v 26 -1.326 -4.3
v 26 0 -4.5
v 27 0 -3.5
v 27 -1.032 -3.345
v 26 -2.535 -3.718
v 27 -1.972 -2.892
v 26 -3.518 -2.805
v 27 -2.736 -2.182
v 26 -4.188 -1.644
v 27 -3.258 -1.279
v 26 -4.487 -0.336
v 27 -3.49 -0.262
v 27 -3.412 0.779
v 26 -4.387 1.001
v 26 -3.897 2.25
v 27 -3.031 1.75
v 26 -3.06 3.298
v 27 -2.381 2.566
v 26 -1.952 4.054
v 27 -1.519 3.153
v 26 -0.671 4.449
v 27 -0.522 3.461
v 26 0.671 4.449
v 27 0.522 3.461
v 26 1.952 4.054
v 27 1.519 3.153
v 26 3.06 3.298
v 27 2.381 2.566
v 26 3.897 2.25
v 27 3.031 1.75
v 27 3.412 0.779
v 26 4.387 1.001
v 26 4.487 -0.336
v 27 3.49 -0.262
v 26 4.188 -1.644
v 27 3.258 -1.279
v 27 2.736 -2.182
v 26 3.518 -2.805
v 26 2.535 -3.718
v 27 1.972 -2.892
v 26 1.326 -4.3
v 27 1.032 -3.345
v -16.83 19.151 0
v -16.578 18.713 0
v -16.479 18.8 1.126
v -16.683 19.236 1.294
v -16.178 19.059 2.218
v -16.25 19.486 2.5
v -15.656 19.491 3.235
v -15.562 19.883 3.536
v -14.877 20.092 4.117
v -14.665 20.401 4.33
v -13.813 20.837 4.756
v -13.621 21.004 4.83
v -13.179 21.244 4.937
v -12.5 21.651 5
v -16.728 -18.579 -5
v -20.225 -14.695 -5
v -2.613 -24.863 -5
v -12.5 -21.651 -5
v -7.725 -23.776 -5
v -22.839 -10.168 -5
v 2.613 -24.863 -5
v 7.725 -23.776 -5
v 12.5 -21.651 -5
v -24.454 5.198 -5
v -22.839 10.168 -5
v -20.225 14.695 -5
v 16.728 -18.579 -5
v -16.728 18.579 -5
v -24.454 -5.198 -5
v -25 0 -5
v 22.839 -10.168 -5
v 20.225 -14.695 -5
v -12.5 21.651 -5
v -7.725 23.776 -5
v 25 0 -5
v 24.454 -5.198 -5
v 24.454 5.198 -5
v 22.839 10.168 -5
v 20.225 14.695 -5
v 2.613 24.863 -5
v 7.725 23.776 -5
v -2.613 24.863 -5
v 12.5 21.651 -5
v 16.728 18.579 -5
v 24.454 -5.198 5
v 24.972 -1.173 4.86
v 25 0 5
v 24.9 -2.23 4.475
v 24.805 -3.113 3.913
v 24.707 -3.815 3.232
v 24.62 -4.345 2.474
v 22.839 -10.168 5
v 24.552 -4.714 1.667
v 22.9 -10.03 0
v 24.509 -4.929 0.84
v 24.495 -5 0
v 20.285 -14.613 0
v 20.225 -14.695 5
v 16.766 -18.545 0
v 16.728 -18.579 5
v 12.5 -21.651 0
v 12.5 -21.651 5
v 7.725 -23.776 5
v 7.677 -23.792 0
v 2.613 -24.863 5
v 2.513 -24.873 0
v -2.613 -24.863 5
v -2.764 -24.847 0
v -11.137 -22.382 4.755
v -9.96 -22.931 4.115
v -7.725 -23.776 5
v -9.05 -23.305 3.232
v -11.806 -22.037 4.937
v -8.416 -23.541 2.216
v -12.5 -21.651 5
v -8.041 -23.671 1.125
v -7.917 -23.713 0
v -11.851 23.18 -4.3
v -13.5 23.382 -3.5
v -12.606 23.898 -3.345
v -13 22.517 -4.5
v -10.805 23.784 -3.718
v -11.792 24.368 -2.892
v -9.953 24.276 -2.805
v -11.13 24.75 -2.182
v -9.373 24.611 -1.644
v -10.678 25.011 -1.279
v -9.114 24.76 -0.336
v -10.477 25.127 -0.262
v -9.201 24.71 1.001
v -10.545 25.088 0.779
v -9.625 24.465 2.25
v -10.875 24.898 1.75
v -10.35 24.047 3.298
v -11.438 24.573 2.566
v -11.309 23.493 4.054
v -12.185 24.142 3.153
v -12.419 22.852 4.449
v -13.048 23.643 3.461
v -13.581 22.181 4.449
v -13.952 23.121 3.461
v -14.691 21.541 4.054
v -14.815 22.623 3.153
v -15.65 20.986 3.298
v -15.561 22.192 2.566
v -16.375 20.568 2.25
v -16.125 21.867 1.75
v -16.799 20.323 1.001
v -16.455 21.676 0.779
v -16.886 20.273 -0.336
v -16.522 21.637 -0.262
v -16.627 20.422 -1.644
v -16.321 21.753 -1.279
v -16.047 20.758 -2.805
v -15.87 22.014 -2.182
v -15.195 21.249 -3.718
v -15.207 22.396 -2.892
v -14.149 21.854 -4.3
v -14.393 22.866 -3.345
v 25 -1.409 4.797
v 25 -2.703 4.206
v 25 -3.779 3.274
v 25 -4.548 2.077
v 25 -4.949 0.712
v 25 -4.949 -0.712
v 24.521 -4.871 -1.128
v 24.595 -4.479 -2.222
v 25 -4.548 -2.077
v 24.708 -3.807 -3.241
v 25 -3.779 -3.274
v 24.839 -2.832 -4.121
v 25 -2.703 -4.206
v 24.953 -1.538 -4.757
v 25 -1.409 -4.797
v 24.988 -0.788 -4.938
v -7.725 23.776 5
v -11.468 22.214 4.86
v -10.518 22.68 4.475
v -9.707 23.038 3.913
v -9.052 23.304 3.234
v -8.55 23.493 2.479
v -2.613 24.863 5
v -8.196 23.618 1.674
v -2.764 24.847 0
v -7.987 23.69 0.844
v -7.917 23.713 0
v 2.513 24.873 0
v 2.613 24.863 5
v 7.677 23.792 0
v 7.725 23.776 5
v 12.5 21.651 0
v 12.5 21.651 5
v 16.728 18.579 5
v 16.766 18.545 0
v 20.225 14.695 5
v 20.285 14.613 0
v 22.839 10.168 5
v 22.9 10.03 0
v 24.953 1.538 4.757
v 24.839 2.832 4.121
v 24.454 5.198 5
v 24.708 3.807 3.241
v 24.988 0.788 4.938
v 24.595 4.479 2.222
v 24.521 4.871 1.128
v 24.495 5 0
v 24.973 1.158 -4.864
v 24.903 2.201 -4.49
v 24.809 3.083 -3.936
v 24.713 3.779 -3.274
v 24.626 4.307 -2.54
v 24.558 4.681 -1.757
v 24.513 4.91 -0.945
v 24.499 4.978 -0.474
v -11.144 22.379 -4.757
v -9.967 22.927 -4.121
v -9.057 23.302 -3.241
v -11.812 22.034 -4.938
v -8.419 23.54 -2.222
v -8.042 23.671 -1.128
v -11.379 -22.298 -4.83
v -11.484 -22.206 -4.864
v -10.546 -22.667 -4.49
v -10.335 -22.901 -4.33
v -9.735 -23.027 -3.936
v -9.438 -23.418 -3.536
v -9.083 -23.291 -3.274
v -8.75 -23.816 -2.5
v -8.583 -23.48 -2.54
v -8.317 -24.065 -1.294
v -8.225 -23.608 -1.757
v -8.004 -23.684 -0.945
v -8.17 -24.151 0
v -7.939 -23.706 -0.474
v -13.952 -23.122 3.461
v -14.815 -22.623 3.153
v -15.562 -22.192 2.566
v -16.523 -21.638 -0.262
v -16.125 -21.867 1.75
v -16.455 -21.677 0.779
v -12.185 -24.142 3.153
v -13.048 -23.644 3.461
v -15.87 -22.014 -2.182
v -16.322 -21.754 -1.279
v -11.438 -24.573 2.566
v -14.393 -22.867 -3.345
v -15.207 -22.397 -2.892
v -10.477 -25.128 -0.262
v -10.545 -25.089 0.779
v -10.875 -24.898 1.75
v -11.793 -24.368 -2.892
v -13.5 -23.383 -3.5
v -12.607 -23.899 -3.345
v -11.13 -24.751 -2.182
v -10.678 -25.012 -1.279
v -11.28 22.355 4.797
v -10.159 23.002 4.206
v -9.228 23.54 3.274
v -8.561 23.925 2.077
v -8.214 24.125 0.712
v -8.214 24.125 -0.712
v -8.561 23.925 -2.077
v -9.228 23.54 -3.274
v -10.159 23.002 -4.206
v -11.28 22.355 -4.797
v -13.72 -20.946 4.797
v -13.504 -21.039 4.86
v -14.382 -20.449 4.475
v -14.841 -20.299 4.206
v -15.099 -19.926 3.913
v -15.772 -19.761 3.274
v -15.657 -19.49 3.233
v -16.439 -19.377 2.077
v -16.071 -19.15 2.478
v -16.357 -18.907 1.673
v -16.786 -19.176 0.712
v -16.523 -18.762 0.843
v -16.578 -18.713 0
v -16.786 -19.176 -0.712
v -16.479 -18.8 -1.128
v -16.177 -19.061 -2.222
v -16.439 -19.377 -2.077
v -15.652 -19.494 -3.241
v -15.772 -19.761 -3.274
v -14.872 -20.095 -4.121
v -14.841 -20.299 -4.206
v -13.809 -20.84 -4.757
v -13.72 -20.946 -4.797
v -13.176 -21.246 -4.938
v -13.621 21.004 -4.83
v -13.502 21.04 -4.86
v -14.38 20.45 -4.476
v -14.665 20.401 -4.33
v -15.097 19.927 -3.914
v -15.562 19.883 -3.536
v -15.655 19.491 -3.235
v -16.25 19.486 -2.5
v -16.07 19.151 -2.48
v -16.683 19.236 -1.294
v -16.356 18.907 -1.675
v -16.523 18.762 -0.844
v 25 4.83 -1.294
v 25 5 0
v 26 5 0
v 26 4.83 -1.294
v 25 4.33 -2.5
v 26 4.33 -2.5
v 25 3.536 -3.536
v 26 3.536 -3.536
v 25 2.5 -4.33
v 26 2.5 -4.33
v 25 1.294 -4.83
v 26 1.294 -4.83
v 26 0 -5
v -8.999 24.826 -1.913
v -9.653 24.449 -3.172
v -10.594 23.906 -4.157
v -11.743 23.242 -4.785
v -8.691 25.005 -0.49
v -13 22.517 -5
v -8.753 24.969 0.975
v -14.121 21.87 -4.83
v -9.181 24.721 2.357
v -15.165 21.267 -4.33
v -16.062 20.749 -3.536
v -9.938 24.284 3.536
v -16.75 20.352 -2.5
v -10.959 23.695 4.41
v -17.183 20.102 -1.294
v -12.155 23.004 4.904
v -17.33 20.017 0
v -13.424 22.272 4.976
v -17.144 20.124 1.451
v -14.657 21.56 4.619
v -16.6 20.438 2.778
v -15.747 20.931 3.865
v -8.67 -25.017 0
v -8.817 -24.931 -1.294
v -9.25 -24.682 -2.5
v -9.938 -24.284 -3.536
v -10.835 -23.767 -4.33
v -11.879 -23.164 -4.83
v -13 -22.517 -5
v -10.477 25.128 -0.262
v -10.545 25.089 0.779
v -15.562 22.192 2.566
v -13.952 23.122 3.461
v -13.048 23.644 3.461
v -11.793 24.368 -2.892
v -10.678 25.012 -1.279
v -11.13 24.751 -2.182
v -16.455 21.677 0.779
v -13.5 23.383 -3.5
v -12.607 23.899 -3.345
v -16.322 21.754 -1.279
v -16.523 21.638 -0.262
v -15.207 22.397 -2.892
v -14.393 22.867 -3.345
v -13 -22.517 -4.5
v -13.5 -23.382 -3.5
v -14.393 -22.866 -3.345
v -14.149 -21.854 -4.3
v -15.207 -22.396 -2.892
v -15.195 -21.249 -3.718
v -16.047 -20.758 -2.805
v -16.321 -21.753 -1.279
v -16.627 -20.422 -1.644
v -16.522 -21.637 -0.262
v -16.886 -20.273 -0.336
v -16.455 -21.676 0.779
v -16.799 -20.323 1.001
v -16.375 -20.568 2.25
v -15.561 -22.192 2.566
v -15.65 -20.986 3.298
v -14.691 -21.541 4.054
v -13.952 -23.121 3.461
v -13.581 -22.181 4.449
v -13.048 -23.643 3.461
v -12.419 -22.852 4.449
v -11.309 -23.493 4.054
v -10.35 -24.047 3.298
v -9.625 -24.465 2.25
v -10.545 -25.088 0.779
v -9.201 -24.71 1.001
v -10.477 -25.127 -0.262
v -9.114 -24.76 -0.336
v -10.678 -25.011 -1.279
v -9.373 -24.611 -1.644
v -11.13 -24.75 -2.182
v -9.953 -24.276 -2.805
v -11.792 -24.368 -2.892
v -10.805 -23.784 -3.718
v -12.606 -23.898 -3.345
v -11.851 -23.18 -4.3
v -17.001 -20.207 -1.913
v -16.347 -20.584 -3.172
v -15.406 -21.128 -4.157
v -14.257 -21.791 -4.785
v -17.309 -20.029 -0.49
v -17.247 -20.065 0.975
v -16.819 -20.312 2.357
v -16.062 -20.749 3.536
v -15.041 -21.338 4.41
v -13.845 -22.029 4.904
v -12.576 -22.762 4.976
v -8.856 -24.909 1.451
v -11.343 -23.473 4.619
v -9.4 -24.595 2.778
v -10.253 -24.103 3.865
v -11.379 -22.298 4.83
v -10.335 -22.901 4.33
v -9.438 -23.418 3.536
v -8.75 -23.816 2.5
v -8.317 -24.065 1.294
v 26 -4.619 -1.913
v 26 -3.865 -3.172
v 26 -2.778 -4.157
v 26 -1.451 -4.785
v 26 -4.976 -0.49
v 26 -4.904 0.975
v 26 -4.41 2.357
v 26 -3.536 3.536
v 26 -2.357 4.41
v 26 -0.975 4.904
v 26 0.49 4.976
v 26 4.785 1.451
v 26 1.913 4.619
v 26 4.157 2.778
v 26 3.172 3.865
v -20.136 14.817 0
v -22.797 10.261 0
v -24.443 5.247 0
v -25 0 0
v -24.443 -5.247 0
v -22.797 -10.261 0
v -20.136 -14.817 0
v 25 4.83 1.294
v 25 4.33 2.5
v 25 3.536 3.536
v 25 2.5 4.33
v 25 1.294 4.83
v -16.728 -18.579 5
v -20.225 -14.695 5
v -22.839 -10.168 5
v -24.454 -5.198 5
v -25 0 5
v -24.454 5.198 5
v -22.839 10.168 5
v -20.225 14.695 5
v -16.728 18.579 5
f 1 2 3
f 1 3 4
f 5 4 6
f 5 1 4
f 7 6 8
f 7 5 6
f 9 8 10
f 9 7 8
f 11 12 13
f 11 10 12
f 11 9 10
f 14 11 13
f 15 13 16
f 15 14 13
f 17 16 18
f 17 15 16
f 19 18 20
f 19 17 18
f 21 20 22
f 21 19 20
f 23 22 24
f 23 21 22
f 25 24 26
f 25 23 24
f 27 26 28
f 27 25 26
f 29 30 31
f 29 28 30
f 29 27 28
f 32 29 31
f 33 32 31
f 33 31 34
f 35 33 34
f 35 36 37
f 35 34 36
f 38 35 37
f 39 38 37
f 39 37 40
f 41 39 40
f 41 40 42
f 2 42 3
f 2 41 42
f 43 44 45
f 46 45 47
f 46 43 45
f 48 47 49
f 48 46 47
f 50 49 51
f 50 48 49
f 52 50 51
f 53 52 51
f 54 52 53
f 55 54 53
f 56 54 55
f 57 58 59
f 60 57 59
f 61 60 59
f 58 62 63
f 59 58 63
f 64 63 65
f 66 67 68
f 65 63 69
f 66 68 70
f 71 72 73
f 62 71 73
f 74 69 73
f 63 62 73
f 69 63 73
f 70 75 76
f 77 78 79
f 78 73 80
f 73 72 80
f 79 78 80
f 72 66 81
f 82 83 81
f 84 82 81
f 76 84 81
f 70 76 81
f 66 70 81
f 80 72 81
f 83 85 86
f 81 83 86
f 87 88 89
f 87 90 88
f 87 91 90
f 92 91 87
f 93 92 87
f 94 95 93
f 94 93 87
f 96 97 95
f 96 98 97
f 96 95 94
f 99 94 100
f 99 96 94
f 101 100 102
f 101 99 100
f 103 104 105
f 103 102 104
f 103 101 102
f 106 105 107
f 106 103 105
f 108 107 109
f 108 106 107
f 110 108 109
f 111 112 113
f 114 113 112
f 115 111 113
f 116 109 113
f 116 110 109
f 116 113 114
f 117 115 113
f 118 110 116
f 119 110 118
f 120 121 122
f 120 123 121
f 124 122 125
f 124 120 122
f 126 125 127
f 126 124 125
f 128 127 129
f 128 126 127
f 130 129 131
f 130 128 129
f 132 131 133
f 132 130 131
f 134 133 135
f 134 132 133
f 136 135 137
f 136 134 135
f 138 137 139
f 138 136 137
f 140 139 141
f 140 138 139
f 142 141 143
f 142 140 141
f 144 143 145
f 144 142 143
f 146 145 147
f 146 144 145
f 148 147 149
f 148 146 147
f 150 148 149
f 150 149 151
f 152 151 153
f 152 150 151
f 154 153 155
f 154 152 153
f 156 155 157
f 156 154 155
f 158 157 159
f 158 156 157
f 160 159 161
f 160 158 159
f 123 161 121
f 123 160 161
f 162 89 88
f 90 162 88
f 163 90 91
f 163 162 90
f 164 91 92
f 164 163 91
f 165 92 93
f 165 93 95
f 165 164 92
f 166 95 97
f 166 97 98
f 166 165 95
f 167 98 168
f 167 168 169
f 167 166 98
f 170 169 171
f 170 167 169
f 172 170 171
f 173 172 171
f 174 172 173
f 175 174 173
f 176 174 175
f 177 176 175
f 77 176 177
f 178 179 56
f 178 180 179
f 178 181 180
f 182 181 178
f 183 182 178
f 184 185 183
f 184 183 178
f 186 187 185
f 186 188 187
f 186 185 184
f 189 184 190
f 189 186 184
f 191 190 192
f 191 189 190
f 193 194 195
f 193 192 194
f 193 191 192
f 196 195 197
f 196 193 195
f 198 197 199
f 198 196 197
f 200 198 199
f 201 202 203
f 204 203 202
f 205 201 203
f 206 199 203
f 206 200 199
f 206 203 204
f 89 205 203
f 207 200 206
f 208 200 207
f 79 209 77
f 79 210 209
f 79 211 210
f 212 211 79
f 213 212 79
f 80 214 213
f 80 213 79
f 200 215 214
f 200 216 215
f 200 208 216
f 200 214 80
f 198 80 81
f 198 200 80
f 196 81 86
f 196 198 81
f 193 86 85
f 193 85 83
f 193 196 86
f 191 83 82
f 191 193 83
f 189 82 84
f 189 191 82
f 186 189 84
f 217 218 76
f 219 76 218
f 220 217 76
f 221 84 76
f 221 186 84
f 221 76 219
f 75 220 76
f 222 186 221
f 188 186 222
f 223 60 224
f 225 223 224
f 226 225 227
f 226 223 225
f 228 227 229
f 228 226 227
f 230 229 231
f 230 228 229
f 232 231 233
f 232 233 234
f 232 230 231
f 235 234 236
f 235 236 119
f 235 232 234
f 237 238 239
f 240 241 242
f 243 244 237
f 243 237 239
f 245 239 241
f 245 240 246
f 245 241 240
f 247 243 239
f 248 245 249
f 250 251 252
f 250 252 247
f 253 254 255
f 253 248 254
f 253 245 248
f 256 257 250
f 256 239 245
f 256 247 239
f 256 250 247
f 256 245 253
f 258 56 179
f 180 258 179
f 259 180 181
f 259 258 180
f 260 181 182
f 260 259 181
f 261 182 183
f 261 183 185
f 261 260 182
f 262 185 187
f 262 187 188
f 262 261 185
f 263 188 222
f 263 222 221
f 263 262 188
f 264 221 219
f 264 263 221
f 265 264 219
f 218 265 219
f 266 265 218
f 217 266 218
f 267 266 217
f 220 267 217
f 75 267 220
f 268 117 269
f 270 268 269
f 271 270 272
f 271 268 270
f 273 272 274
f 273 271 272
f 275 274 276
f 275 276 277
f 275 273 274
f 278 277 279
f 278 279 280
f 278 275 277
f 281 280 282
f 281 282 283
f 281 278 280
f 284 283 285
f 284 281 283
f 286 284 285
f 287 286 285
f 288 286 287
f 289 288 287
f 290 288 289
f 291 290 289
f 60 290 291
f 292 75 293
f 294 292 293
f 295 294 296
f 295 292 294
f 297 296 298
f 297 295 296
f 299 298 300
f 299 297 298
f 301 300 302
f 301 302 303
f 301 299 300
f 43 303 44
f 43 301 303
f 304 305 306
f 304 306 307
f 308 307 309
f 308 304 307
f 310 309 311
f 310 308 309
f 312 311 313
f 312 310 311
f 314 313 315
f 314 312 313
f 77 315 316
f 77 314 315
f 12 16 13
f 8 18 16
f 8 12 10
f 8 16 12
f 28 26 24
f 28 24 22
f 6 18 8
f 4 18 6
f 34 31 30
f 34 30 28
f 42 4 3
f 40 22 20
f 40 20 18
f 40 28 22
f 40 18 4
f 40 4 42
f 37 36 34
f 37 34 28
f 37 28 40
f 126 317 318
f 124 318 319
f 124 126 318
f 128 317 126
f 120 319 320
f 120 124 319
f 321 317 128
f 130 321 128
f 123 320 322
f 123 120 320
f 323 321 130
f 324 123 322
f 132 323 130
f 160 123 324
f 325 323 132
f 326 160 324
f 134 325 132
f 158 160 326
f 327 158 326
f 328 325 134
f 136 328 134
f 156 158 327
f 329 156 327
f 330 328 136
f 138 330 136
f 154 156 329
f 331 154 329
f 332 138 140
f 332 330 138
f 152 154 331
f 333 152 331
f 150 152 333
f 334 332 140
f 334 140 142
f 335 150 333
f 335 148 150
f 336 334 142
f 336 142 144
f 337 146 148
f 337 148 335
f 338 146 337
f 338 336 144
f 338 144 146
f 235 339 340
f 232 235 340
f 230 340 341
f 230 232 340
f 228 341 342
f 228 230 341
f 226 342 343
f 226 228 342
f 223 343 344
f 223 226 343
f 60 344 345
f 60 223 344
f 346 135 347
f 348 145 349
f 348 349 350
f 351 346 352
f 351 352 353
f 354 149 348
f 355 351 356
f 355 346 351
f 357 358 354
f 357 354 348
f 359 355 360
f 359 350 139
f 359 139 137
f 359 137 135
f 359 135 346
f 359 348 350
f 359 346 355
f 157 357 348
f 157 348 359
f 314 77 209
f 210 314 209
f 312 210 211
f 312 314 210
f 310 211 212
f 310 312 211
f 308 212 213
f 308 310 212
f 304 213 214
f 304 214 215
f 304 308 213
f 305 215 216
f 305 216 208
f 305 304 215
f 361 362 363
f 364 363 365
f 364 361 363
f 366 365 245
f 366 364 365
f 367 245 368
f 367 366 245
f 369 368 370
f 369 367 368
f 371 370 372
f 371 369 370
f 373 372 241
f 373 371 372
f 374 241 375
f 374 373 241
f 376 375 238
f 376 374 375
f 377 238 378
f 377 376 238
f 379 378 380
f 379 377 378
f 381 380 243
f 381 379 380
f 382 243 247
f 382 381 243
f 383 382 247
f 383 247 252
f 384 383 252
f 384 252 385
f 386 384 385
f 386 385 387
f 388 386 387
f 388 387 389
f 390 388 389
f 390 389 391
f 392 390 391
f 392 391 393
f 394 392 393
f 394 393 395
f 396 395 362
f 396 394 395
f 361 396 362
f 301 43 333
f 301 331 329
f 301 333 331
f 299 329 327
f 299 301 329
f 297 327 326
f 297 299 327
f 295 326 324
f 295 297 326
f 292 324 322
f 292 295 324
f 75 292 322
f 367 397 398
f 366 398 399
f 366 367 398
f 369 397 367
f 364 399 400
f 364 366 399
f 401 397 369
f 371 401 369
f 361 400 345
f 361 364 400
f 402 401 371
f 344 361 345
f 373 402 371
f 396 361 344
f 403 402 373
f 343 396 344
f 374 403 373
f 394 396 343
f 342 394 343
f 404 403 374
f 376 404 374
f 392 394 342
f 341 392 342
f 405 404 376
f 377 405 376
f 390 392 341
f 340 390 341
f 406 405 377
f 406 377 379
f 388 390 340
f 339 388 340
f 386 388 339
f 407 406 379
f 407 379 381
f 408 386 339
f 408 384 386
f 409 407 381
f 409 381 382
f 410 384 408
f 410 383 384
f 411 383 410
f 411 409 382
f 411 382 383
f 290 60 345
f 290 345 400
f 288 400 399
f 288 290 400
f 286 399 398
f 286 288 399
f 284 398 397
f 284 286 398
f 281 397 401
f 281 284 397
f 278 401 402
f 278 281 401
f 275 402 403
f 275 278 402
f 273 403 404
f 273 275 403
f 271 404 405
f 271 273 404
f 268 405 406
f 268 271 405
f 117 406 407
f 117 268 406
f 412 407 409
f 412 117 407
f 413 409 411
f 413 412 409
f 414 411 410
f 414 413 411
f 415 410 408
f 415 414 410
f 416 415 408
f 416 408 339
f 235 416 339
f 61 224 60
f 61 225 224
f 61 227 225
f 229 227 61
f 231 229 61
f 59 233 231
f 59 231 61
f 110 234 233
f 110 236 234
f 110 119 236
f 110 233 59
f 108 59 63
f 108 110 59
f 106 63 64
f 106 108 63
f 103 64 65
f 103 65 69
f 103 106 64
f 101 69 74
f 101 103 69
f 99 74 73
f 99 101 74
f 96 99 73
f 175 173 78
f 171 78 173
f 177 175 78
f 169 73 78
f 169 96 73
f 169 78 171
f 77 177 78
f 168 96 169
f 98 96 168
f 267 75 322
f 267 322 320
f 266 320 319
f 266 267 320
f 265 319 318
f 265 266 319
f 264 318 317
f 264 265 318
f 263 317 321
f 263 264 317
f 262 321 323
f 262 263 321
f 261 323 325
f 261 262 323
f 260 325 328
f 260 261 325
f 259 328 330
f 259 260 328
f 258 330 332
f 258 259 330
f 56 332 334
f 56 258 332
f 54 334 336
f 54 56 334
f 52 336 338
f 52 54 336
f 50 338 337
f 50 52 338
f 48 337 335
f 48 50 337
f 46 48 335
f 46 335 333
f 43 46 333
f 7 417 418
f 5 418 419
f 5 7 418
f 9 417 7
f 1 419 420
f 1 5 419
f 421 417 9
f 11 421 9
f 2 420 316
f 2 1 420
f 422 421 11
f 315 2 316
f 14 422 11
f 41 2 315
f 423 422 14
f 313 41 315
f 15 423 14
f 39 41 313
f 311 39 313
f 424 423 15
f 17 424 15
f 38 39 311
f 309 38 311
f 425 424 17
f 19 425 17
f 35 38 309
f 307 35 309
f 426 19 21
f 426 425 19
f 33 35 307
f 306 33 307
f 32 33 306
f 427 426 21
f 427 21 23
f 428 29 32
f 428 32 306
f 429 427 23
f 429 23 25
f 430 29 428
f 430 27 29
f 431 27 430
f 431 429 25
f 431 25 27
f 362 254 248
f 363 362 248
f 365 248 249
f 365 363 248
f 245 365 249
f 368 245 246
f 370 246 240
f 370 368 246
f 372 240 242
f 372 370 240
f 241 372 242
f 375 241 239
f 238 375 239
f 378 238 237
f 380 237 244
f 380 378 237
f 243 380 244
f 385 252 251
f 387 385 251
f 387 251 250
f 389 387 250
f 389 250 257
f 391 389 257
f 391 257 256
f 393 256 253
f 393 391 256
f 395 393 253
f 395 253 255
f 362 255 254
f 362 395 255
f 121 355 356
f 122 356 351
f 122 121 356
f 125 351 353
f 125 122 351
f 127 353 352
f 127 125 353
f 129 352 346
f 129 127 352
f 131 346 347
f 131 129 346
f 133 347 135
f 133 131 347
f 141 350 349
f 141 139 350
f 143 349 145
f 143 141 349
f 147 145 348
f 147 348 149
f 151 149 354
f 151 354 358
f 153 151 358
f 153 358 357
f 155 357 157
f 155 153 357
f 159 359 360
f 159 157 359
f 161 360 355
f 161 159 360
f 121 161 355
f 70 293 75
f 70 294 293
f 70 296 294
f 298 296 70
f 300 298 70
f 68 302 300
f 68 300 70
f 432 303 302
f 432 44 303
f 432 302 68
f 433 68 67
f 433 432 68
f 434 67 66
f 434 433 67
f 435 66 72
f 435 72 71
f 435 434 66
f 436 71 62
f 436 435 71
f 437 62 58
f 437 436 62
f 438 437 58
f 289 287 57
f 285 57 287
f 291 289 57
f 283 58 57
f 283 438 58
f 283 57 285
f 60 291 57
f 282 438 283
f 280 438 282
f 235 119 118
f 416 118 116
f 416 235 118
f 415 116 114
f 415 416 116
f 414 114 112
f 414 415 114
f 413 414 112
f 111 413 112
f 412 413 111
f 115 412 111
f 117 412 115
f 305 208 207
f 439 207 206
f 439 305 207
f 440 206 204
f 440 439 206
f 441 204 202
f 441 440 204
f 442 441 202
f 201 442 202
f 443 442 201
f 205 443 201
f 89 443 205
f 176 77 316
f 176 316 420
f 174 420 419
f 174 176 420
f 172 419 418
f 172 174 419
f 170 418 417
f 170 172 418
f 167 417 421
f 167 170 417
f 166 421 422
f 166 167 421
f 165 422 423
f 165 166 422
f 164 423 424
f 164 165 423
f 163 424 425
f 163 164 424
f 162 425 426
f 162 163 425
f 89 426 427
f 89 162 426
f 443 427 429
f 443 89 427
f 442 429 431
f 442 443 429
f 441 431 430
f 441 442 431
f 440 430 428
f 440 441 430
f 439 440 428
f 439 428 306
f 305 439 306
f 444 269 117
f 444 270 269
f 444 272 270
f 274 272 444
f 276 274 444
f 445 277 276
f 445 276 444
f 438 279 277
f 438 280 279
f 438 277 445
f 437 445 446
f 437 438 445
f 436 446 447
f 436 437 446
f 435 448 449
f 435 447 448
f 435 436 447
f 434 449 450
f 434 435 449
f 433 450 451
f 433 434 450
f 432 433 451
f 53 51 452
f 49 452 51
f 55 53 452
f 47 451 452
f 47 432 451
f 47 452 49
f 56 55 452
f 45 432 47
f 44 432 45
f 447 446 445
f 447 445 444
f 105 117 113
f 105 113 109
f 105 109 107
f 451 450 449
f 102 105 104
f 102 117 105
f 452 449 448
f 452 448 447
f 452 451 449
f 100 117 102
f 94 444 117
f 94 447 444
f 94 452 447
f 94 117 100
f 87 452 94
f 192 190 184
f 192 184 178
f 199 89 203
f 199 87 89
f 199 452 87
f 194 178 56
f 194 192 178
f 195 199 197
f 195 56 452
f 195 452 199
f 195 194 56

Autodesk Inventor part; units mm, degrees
ref_plane "XZ Plane" through (0, 0, 0) normal (0, 1, 0) x (-1, 0, 0)
ref_plane "XY Plane" through (0, 0, 0) normal (0, 0, 1) x (1, 0, 0)
sketch "Sketch1" plane through (0, 0, 0) normal (0, 0, 1) x (1, 0, 0)
  circle A0 centre (0, 0) radius 25
  dimension "d0" = 50
extrude "Extrusion1" add sketch "Sketch1" along normal mid plane 10
ref_plane "Work Plane1" through (25, 0, 0) normal (1, 0, 0) x (0, 1, 0)
sketch "Sketch2" plane through (25, 0, 0) normal (1, 0, 0) x (0, 1, 0)
  circle A0 centre (0, 0) radius 5
  line L0 (-25, -5) -> (25, -5) projected
  point P0 (0, 0)
extrude "Extrusion2" add sketch "Sketch2" along normal mid plane 2
sketch "Sketch3" plane through (26, 0, 0) normal (1, 0, 0) x (0, 0, -1)
  circle A0 centre (0, 0) radius 3.5
  point P0 (0, 0)
  dimension "d5" = 7
extrude "Extrusion3" add sketch "Sketch3" along normal blind 1
chamfer "Chamfer1" distance 1 angle 45 1 edges at (26, 0, 3.5)
pattern_circular "Circular Pattern1" count 3 over 360 about axis through (0, 0, 0) along (0, 0, 1) of "Extrusion2", "Extrusion3", "Chamfer1"
properties part number "Platform"
